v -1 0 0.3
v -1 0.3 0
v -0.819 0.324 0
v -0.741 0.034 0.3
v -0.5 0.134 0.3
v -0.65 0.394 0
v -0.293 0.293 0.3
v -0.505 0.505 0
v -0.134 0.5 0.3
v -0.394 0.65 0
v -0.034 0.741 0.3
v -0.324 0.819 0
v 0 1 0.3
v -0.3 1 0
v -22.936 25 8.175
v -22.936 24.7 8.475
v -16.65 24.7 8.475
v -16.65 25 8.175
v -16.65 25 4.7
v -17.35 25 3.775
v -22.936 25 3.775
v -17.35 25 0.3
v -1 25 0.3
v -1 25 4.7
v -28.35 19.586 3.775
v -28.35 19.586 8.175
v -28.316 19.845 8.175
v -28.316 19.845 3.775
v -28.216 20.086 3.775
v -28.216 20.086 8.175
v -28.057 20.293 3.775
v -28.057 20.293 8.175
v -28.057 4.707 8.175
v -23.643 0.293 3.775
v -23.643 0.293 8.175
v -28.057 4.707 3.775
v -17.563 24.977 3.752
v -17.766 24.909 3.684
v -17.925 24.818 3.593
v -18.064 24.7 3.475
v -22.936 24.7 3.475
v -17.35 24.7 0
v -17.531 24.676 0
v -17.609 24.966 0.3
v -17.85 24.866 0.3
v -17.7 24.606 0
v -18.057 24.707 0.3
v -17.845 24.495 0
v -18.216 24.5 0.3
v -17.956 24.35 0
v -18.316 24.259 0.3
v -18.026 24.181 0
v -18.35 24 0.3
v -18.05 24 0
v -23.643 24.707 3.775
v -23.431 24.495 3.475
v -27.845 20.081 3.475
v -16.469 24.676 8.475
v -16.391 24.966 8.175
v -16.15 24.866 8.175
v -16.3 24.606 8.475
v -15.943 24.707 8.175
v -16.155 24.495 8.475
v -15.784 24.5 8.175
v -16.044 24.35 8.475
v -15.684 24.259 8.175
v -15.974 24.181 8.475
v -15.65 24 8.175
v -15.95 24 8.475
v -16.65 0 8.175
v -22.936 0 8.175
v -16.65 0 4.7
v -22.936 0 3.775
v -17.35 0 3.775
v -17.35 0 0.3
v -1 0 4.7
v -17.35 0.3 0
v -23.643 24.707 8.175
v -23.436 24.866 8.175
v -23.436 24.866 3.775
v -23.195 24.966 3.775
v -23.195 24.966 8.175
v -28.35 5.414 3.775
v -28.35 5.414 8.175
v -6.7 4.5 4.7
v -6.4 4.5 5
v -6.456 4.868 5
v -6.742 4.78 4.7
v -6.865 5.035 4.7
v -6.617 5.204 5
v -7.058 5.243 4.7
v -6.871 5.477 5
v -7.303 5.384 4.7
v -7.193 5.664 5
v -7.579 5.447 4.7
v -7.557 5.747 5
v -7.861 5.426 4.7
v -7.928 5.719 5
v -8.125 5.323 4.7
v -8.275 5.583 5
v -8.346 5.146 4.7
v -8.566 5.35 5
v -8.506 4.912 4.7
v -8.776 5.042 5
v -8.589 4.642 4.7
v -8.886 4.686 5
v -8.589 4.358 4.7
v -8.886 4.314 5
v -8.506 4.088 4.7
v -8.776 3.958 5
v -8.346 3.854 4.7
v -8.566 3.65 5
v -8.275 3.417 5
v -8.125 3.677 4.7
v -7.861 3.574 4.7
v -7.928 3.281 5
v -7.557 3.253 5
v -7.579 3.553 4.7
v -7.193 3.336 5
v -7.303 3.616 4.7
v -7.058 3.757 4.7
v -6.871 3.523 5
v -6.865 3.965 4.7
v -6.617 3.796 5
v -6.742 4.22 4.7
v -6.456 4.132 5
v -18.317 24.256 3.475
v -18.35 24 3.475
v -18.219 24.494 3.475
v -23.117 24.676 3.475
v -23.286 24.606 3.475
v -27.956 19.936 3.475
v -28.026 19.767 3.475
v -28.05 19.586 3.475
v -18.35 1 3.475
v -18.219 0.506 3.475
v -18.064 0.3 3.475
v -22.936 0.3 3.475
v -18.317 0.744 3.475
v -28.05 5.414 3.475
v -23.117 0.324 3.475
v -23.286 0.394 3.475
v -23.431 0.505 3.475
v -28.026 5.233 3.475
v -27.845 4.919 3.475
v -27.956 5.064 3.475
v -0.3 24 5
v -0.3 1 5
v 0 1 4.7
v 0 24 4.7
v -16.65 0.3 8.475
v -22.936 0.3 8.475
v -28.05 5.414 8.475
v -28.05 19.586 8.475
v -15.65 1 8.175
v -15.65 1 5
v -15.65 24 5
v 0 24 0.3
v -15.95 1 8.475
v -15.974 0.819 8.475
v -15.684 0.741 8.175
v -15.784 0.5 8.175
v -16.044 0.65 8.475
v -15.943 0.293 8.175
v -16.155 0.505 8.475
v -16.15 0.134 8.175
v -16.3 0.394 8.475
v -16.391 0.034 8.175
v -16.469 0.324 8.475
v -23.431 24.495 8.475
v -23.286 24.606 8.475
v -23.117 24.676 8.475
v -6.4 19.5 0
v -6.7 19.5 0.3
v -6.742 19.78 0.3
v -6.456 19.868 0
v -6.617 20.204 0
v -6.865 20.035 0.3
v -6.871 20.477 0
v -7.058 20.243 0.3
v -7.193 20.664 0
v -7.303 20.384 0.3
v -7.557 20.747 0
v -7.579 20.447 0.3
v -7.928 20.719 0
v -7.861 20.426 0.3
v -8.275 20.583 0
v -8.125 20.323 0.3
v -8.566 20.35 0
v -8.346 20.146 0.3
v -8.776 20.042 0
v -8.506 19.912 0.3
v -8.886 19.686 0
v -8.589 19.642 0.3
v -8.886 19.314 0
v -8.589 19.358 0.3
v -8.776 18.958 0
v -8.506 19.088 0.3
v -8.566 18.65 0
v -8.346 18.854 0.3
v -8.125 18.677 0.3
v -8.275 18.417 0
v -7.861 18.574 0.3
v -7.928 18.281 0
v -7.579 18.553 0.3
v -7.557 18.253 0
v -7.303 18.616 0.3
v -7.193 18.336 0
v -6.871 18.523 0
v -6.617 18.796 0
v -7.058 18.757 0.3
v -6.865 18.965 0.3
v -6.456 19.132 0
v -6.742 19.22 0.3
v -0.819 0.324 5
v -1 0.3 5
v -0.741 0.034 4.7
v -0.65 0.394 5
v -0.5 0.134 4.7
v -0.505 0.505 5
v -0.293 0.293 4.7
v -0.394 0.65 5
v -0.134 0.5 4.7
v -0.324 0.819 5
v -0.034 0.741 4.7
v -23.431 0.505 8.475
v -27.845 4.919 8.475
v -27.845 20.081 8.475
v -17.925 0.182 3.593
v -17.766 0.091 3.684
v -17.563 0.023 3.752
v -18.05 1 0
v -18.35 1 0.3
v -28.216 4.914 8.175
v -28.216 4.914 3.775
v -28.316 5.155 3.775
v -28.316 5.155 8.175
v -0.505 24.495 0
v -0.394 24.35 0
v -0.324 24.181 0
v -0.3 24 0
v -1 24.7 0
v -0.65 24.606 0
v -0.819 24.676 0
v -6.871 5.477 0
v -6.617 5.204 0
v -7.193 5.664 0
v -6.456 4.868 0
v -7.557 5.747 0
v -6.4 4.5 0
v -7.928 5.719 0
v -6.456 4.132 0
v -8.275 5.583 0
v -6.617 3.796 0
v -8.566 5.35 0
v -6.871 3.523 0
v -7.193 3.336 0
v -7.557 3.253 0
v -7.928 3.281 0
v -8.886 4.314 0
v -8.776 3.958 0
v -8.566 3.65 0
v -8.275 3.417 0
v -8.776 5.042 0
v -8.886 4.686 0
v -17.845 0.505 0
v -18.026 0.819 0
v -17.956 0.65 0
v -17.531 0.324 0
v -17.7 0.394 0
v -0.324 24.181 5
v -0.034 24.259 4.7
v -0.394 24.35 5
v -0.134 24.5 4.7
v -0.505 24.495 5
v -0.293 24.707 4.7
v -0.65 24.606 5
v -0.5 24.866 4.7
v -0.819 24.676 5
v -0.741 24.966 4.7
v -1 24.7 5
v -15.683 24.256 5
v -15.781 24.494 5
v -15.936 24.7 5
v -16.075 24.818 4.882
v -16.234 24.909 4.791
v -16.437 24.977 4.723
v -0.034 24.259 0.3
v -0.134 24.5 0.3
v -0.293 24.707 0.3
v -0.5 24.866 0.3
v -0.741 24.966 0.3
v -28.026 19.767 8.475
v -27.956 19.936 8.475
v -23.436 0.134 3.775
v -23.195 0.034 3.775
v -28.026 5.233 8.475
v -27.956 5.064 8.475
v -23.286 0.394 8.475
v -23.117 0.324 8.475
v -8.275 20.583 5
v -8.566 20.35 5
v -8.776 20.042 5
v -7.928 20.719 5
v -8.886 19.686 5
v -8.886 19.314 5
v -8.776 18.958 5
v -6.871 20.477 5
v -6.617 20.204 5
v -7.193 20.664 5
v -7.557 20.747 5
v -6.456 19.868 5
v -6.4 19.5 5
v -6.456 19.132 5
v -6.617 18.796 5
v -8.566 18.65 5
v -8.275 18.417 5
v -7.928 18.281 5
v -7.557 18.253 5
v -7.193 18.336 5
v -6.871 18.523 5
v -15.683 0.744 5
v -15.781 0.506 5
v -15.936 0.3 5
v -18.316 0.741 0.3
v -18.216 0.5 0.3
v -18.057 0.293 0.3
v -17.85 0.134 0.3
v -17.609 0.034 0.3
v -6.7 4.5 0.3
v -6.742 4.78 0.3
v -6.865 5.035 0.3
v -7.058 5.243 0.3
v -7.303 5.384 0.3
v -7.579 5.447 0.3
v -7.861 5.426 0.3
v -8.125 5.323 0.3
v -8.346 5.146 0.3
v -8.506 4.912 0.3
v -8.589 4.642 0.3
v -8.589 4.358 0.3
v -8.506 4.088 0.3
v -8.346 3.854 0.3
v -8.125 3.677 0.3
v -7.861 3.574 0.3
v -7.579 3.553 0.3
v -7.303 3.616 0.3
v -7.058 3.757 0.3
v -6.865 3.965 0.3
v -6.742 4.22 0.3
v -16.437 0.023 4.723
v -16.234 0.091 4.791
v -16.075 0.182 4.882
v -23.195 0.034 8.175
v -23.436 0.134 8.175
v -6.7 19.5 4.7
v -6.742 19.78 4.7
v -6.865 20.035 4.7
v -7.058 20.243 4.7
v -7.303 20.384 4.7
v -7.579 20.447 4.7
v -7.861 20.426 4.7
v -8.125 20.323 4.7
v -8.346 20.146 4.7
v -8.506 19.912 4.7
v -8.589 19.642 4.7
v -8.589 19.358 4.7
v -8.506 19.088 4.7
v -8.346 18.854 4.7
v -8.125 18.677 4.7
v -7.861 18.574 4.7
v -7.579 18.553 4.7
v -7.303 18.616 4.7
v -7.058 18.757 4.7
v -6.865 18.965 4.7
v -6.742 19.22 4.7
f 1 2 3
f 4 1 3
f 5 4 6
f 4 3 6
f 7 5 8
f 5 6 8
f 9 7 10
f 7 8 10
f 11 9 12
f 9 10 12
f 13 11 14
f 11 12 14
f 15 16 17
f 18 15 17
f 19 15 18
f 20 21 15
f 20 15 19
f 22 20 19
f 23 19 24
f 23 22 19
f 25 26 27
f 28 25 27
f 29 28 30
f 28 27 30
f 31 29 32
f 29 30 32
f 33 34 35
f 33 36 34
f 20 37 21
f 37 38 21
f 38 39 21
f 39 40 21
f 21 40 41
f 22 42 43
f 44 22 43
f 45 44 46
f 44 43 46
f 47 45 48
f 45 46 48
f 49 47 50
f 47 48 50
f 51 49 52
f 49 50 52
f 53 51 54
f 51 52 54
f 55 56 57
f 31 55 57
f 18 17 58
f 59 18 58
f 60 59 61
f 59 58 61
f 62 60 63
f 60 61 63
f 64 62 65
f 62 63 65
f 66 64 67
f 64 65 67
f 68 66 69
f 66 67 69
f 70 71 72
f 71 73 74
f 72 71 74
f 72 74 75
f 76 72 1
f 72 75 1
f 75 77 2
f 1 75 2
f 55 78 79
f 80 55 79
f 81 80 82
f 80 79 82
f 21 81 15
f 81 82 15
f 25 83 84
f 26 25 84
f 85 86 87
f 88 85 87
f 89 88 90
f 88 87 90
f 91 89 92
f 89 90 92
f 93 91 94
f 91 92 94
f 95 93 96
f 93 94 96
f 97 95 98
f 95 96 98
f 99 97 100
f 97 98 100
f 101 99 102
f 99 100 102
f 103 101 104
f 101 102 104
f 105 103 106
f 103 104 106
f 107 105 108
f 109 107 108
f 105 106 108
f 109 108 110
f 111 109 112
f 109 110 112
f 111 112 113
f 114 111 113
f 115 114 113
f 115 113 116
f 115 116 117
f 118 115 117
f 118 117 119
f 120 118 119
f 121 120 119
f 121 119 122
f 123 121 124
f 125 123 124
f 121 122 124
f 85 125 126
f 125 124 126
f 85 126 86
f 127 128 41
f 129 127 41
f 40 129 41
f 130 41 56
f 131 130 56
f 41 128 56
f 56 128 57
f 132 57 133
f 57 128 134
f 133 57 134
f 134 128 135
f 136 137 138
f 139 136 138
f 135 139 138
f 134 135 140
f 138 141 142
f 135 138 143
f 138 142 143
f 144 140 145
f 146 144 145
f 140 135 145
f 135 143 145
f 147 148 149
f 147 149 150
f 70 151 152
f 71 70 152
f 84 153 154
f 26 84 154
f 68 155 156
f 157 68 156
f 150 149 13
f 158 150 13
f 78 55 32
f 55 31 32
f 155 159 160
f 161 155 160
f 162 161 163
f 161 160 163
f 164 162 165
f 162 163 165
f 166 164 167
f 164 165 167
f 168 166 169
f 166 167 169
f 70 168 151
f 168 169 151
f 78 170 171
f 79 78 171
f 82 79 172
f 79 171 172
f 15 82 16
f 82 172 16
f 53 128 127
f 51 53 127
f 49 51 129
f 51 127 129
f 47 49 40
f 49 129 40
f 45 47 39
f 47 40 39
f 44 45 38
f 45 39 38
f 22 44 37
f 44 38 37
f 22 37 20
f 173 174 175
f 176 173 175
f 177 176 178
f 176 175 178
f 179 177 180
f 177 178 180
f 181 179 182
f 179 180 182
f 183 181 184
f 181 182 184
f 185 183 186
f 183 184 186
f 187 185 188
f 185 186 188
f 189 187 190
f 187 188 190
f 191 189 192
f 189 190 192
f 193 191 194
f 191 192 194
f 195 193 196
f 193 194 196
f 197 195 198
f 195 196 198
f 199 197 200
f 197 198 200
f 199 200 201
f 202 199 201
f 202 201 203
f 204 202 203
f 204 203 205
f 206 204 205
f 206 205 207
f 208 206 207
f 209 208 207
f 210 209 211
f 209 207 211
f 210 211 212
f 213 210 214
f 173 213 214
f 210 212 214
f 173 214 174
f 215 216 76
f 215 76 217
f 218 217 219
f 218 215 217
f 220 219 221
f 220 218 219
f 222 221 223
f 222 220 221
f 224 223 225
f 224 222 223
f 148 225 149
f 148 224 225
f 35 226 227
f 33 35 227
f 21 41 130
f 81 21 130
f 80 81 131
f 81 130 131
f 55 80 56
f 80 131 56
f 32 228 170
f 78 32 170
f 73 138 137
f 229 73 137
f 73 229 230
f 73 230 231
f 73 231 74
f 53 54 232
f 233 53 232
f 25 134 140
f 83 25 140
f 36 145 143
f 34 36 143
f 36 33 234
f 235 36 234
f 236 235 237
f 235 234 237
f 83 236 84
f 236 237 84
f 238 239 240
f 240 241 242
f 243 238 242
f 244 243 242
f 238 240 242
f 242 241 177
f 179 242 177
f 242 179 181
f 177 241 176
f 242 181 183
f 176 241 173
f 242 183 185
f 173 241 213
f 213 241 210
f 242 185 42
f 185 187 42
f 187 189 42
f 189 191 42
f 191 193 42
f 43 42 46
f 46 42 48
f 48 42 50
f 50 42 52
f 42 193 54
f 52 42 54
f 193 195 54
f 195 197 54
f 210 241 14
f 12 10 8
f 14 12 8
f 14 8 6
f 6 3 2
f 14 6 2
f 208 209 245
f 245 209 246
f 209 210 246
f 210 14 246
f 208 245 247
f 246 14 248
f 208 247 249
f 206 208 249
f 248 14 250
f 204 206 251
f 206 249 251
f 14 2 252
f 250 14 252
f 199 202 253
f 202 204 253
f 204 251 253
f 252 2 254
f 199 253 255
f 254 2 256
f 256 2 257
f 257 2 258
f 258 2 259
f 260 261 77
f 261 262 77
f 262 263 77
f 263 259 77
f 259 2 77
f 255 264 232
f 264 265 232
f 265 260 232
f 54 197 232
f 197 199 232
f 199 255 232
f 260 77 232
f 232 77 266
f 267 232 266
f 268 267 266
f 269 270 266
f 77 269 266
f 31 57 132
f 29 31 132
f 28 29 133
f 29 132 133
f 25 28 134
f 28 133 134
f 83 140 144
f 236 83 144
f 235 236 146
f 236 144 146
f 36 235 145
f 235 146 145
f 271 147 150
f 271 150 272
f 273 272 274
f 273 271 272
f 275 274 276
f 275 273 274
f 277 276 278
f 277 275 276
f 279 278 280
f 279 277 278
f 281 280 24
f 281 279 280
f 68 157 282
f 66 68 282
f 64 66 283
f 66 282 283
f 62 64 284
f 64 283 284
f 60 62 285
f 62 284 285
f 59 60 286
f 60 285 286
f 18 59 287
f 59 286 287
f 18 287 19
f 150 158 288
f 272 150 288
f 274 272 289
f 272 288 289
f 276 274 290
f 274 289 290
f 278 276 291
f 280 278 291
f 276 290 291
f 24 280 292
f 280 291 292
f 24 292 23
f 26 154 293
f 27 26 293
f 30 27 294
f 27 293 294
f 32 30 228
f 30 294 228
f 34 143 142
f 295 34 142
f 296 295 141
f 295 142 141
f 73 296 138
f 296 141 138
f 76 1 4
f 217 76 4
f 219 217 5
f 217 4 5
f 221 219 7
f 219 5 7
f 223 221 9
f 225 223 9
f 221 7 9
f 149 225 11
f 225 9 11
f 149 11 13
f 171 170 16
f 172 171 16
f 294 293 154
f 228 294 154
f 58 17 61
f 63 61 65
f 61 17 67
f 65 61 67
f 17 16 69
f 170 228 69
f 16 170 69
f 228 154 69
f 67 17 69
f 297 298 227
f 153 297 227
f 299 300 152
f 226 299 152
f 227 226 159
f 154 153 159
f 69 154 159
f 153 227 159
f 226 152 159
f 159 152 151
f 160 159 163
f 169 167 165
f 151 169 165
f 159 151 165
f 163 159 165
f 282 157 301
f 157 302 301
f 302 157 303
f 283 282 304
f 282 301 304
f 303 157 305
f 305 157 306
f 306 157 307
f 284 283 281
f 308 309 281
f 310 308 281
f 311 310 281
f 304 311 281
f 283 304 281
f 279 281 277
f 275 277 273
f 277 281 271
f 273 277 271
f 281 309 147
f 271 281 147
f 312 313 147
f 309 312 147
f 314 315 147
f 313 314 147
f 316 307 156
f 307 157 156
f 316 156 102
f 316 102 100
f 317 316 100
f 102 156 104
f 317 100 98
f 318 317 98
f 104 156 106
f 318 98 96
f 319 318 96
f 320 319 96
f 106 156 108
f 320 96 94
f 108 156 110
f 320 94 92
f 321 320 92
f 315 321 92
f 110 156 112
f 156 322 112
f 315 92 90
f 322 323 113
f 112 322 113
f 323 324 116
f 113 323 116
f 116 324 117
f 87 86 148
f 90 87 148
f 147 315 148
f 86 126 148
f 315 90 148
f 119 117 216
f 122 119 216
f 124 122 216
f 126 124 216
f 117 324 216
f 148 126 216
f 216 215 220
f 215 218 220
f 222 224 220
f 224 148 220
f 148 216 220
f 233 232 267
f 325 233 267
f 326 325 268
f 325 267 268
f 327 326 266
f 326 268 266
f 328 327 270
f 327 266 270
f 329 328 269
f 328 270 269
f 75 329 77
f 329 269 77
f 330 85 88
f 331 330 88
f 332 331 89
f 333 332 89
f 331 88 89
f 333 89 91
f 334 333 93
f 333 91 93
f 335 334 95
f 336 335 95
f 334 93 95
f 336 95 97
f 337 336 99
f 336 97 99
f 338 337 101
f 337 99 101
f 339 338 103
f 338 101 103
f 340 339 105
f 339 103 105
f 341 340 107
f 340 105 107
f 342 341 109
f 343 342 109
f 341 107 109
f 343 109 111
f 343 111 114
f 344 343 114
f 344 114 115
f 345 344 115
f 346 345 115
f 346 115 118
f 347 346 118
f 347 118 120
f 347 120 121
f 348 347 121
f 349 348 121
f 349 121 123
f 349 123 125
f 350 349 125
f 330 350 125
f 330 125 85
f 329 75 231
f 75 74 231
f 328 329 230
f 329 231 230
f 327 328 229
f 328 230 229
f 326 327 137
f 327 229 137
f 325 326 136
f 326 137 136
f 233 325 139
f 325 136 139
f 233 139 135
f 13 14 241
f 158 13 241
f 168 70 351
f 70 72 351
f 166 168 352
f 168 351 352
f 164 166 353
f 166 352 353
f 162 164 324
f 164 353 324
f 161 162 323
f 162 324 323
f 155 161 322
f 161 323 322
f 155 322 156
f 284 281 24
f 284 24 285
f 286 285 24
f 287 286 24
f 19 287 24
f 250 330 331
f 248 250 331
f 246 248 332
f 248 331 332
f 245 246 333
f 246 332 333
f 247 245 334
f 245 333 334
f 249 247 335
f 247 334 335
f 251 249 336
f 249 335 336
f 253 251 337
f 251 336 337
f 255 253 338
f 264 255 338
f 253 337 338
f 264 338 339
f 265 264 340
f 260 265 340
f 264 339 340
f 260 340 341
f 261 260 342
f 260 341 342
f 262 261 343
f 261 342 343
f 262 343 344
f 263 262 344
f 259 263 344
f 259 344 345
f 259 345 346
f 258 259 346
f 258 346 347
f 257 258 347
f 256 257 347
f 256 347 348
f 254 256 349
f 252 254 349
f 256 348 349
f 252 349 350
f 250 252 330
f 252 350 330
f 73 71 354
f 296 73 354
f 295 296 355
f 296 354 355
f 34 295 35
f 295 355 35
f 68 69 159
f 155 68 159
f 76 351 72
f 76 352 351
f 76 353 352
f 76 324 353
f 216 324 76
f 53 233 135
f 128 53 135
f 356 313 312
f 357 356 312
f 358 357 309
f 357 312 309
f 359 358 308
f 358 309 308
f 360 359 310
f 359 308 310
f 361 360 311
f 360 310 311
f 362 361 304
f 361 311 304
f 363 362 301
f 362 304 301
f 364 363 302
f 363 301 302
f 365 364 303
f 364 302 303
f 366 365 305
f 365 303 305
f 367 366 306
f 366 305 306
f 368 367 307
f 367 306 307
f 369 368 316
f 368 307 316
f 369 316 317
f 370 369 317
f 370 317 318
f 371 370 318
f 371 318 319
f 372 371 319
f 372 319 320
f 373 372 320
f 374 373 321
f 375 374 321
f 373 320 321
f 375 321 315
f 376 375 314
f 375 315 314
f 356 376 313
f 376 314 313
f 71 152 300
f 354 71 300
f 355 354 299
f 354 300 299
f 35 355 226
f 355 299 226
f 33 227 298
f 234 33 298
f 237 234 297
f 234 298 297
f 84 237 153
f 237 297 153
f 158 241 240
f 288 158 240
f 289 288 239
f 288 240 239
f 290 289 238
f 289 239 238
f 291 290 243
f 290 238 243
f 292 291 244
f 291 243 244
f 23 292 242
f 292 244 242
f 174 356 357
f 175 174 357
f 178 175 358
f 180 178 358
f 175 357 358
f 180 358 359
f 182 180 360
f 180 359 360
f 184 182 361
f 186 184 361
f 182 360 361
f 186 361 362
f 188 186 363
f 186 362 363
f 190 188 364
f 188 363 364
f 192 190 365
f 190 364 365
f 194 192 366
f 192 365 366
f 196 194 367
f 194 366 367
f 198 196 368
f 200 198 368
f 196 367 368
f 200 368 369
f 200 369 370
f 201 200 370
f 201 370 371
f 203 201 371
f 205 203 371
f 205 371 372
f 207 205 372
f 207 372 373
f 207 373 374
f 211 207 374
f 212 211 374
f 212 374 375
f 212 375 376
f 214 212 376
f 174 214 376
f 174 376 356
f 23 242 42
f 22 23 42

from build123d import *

# Parameters (mm, degrees)
BOSS_EXTRUDE1_DEPTH = 25
SKETCH2_R           = 0.95
CUT_EXTRUDE1_DEPTH  = 25
CHAMFER1_SIZE       = 5
FILLET1_R           = 1
CHAMFER2_SIZE       = 0.3


with BuildPart() as part:
    # Sketch1 → Boss-Extrude1 (new body)
    with BuildSketch(Plane(origin=(0, 0, 0), x_dir=(1, 0, 0), z_dir=(0, 1, 0))):
        Polygon((0, 0), (-18.35, 0), (-18.35, -3.475), (-28.35, -3.475), (-28.35, -8.475), (-15.65, -8.475), (-15.65, -5), (0, -5), align=None)
    extrude(amount=BOSS_EXTRUDE1_DEPTH)

    # Sketch2 → Cut-Extrude1 (cut)
    with BuildSketch(Plane.XY.offset(5)):
        with Locations((-7.65, 4.5)):
            Circle(SKETCH2_R)
        with Locations((-7.65, 19.5)):
            Circle(SKETCH2_R)
    extrude(amount=-CUT_EXTRUDE1_DEPTH, mode=Mode.SUBTRACT)

    # Chamfer1
    chamfer1_edges = [part.edges().sort_by_distance(p)[0] for p in [
        (-28.35, 25, 5.975),
        (-28.35, 0, 5.975),
    ]]
    chamfer(chamfer1_edges, length=CHAMFER1_SIZE)

    # Fillet1
    fillet1_edges = [part.edges().sort_by_distance(p)[0] for p in [
        (-18.35, 0, 1.7375),
        (0, 0, 2.5),
        (-18.35, 25, 1.7375),
        (-15.65, 25, 6.7375),
        (-28.35, 20, 5.975),
        (-28.35, 5, 5.975),
        (-23.35, 0, 5.975),
        (-23.35, 25, 5.975),
        (0, 25, 2.5),
        (-15.65, 0, 6.7375),
    ]]
    fillet(fillet1_edges, radius=FILLET1_R)

    # Chamfer2
    chamfer2_edges = [part.edges().sort_by_distance(p)[0] for p in [
        (-20.642893219, 0, 3.475),
        (-20.642893219, 25, 3.475),
        (-8.6, 4.5, 0),
        (-8.6, 4.5, 5),
        (-8.6, 19.5, 0),
        (-8.6, 19.5, 5),
        (-8.325, 25, 5),
        (-19.792893219, 25, 8.475),
        (-9.175, 25, 0),
        (-15.65, 12.5, 8.475),
        (-28.35, 12.5, 8.475),
        (-25.85, 2.5, 8.475),
        (-19.792893219, 0, 8.475),
        (-25.85, 22.5, 8.475),
        (-28.273879533, 5.03153013, 8.475),
        (-23.31846987, 0.076120467, 8.475),
        (-15.942893219, 0.292893219, 8.475),
        (-28.273879533, 19.96846987, 8.475),
        (-23.31846987, 24.923879533, 8.475),
        (-15.942893219, 24.707106781, 8.475),
        (-25.85, 22.5, 3.475),
        (-25.85, 2.5, 3.475),
        (-28.35, 12.5, 3.475),
        (-28.273879533, 5.03153013, 3.475),
        (-23.31846987, 0.076120467, 3.475),
        (-28.273879533, 19.96846987, 3.475),
        (-23.31846987, 24.923879533, 3.475),
        (-9.175, 0, 0),
        (-18.35, 12.5, 0),
        (0, 12.5, 0),
        (-0.292893219, 0.292893219, 0),
        (-18.057106781, 0.292893219, 0),
        (-18.057106781, 24.707106781, 0),
        (-0.292893219, 24.707106781, 0),
        (0, 12.5, 5),
        (-0.292893219, 0.292893219, 5),
        (-0.292893219, 24.707106781, 5),
        (-8.325, 0, 5),
    ]]
    chamfer(chamfer2_edges, length=CHAMFER2_SIZE)


solid = part.part
